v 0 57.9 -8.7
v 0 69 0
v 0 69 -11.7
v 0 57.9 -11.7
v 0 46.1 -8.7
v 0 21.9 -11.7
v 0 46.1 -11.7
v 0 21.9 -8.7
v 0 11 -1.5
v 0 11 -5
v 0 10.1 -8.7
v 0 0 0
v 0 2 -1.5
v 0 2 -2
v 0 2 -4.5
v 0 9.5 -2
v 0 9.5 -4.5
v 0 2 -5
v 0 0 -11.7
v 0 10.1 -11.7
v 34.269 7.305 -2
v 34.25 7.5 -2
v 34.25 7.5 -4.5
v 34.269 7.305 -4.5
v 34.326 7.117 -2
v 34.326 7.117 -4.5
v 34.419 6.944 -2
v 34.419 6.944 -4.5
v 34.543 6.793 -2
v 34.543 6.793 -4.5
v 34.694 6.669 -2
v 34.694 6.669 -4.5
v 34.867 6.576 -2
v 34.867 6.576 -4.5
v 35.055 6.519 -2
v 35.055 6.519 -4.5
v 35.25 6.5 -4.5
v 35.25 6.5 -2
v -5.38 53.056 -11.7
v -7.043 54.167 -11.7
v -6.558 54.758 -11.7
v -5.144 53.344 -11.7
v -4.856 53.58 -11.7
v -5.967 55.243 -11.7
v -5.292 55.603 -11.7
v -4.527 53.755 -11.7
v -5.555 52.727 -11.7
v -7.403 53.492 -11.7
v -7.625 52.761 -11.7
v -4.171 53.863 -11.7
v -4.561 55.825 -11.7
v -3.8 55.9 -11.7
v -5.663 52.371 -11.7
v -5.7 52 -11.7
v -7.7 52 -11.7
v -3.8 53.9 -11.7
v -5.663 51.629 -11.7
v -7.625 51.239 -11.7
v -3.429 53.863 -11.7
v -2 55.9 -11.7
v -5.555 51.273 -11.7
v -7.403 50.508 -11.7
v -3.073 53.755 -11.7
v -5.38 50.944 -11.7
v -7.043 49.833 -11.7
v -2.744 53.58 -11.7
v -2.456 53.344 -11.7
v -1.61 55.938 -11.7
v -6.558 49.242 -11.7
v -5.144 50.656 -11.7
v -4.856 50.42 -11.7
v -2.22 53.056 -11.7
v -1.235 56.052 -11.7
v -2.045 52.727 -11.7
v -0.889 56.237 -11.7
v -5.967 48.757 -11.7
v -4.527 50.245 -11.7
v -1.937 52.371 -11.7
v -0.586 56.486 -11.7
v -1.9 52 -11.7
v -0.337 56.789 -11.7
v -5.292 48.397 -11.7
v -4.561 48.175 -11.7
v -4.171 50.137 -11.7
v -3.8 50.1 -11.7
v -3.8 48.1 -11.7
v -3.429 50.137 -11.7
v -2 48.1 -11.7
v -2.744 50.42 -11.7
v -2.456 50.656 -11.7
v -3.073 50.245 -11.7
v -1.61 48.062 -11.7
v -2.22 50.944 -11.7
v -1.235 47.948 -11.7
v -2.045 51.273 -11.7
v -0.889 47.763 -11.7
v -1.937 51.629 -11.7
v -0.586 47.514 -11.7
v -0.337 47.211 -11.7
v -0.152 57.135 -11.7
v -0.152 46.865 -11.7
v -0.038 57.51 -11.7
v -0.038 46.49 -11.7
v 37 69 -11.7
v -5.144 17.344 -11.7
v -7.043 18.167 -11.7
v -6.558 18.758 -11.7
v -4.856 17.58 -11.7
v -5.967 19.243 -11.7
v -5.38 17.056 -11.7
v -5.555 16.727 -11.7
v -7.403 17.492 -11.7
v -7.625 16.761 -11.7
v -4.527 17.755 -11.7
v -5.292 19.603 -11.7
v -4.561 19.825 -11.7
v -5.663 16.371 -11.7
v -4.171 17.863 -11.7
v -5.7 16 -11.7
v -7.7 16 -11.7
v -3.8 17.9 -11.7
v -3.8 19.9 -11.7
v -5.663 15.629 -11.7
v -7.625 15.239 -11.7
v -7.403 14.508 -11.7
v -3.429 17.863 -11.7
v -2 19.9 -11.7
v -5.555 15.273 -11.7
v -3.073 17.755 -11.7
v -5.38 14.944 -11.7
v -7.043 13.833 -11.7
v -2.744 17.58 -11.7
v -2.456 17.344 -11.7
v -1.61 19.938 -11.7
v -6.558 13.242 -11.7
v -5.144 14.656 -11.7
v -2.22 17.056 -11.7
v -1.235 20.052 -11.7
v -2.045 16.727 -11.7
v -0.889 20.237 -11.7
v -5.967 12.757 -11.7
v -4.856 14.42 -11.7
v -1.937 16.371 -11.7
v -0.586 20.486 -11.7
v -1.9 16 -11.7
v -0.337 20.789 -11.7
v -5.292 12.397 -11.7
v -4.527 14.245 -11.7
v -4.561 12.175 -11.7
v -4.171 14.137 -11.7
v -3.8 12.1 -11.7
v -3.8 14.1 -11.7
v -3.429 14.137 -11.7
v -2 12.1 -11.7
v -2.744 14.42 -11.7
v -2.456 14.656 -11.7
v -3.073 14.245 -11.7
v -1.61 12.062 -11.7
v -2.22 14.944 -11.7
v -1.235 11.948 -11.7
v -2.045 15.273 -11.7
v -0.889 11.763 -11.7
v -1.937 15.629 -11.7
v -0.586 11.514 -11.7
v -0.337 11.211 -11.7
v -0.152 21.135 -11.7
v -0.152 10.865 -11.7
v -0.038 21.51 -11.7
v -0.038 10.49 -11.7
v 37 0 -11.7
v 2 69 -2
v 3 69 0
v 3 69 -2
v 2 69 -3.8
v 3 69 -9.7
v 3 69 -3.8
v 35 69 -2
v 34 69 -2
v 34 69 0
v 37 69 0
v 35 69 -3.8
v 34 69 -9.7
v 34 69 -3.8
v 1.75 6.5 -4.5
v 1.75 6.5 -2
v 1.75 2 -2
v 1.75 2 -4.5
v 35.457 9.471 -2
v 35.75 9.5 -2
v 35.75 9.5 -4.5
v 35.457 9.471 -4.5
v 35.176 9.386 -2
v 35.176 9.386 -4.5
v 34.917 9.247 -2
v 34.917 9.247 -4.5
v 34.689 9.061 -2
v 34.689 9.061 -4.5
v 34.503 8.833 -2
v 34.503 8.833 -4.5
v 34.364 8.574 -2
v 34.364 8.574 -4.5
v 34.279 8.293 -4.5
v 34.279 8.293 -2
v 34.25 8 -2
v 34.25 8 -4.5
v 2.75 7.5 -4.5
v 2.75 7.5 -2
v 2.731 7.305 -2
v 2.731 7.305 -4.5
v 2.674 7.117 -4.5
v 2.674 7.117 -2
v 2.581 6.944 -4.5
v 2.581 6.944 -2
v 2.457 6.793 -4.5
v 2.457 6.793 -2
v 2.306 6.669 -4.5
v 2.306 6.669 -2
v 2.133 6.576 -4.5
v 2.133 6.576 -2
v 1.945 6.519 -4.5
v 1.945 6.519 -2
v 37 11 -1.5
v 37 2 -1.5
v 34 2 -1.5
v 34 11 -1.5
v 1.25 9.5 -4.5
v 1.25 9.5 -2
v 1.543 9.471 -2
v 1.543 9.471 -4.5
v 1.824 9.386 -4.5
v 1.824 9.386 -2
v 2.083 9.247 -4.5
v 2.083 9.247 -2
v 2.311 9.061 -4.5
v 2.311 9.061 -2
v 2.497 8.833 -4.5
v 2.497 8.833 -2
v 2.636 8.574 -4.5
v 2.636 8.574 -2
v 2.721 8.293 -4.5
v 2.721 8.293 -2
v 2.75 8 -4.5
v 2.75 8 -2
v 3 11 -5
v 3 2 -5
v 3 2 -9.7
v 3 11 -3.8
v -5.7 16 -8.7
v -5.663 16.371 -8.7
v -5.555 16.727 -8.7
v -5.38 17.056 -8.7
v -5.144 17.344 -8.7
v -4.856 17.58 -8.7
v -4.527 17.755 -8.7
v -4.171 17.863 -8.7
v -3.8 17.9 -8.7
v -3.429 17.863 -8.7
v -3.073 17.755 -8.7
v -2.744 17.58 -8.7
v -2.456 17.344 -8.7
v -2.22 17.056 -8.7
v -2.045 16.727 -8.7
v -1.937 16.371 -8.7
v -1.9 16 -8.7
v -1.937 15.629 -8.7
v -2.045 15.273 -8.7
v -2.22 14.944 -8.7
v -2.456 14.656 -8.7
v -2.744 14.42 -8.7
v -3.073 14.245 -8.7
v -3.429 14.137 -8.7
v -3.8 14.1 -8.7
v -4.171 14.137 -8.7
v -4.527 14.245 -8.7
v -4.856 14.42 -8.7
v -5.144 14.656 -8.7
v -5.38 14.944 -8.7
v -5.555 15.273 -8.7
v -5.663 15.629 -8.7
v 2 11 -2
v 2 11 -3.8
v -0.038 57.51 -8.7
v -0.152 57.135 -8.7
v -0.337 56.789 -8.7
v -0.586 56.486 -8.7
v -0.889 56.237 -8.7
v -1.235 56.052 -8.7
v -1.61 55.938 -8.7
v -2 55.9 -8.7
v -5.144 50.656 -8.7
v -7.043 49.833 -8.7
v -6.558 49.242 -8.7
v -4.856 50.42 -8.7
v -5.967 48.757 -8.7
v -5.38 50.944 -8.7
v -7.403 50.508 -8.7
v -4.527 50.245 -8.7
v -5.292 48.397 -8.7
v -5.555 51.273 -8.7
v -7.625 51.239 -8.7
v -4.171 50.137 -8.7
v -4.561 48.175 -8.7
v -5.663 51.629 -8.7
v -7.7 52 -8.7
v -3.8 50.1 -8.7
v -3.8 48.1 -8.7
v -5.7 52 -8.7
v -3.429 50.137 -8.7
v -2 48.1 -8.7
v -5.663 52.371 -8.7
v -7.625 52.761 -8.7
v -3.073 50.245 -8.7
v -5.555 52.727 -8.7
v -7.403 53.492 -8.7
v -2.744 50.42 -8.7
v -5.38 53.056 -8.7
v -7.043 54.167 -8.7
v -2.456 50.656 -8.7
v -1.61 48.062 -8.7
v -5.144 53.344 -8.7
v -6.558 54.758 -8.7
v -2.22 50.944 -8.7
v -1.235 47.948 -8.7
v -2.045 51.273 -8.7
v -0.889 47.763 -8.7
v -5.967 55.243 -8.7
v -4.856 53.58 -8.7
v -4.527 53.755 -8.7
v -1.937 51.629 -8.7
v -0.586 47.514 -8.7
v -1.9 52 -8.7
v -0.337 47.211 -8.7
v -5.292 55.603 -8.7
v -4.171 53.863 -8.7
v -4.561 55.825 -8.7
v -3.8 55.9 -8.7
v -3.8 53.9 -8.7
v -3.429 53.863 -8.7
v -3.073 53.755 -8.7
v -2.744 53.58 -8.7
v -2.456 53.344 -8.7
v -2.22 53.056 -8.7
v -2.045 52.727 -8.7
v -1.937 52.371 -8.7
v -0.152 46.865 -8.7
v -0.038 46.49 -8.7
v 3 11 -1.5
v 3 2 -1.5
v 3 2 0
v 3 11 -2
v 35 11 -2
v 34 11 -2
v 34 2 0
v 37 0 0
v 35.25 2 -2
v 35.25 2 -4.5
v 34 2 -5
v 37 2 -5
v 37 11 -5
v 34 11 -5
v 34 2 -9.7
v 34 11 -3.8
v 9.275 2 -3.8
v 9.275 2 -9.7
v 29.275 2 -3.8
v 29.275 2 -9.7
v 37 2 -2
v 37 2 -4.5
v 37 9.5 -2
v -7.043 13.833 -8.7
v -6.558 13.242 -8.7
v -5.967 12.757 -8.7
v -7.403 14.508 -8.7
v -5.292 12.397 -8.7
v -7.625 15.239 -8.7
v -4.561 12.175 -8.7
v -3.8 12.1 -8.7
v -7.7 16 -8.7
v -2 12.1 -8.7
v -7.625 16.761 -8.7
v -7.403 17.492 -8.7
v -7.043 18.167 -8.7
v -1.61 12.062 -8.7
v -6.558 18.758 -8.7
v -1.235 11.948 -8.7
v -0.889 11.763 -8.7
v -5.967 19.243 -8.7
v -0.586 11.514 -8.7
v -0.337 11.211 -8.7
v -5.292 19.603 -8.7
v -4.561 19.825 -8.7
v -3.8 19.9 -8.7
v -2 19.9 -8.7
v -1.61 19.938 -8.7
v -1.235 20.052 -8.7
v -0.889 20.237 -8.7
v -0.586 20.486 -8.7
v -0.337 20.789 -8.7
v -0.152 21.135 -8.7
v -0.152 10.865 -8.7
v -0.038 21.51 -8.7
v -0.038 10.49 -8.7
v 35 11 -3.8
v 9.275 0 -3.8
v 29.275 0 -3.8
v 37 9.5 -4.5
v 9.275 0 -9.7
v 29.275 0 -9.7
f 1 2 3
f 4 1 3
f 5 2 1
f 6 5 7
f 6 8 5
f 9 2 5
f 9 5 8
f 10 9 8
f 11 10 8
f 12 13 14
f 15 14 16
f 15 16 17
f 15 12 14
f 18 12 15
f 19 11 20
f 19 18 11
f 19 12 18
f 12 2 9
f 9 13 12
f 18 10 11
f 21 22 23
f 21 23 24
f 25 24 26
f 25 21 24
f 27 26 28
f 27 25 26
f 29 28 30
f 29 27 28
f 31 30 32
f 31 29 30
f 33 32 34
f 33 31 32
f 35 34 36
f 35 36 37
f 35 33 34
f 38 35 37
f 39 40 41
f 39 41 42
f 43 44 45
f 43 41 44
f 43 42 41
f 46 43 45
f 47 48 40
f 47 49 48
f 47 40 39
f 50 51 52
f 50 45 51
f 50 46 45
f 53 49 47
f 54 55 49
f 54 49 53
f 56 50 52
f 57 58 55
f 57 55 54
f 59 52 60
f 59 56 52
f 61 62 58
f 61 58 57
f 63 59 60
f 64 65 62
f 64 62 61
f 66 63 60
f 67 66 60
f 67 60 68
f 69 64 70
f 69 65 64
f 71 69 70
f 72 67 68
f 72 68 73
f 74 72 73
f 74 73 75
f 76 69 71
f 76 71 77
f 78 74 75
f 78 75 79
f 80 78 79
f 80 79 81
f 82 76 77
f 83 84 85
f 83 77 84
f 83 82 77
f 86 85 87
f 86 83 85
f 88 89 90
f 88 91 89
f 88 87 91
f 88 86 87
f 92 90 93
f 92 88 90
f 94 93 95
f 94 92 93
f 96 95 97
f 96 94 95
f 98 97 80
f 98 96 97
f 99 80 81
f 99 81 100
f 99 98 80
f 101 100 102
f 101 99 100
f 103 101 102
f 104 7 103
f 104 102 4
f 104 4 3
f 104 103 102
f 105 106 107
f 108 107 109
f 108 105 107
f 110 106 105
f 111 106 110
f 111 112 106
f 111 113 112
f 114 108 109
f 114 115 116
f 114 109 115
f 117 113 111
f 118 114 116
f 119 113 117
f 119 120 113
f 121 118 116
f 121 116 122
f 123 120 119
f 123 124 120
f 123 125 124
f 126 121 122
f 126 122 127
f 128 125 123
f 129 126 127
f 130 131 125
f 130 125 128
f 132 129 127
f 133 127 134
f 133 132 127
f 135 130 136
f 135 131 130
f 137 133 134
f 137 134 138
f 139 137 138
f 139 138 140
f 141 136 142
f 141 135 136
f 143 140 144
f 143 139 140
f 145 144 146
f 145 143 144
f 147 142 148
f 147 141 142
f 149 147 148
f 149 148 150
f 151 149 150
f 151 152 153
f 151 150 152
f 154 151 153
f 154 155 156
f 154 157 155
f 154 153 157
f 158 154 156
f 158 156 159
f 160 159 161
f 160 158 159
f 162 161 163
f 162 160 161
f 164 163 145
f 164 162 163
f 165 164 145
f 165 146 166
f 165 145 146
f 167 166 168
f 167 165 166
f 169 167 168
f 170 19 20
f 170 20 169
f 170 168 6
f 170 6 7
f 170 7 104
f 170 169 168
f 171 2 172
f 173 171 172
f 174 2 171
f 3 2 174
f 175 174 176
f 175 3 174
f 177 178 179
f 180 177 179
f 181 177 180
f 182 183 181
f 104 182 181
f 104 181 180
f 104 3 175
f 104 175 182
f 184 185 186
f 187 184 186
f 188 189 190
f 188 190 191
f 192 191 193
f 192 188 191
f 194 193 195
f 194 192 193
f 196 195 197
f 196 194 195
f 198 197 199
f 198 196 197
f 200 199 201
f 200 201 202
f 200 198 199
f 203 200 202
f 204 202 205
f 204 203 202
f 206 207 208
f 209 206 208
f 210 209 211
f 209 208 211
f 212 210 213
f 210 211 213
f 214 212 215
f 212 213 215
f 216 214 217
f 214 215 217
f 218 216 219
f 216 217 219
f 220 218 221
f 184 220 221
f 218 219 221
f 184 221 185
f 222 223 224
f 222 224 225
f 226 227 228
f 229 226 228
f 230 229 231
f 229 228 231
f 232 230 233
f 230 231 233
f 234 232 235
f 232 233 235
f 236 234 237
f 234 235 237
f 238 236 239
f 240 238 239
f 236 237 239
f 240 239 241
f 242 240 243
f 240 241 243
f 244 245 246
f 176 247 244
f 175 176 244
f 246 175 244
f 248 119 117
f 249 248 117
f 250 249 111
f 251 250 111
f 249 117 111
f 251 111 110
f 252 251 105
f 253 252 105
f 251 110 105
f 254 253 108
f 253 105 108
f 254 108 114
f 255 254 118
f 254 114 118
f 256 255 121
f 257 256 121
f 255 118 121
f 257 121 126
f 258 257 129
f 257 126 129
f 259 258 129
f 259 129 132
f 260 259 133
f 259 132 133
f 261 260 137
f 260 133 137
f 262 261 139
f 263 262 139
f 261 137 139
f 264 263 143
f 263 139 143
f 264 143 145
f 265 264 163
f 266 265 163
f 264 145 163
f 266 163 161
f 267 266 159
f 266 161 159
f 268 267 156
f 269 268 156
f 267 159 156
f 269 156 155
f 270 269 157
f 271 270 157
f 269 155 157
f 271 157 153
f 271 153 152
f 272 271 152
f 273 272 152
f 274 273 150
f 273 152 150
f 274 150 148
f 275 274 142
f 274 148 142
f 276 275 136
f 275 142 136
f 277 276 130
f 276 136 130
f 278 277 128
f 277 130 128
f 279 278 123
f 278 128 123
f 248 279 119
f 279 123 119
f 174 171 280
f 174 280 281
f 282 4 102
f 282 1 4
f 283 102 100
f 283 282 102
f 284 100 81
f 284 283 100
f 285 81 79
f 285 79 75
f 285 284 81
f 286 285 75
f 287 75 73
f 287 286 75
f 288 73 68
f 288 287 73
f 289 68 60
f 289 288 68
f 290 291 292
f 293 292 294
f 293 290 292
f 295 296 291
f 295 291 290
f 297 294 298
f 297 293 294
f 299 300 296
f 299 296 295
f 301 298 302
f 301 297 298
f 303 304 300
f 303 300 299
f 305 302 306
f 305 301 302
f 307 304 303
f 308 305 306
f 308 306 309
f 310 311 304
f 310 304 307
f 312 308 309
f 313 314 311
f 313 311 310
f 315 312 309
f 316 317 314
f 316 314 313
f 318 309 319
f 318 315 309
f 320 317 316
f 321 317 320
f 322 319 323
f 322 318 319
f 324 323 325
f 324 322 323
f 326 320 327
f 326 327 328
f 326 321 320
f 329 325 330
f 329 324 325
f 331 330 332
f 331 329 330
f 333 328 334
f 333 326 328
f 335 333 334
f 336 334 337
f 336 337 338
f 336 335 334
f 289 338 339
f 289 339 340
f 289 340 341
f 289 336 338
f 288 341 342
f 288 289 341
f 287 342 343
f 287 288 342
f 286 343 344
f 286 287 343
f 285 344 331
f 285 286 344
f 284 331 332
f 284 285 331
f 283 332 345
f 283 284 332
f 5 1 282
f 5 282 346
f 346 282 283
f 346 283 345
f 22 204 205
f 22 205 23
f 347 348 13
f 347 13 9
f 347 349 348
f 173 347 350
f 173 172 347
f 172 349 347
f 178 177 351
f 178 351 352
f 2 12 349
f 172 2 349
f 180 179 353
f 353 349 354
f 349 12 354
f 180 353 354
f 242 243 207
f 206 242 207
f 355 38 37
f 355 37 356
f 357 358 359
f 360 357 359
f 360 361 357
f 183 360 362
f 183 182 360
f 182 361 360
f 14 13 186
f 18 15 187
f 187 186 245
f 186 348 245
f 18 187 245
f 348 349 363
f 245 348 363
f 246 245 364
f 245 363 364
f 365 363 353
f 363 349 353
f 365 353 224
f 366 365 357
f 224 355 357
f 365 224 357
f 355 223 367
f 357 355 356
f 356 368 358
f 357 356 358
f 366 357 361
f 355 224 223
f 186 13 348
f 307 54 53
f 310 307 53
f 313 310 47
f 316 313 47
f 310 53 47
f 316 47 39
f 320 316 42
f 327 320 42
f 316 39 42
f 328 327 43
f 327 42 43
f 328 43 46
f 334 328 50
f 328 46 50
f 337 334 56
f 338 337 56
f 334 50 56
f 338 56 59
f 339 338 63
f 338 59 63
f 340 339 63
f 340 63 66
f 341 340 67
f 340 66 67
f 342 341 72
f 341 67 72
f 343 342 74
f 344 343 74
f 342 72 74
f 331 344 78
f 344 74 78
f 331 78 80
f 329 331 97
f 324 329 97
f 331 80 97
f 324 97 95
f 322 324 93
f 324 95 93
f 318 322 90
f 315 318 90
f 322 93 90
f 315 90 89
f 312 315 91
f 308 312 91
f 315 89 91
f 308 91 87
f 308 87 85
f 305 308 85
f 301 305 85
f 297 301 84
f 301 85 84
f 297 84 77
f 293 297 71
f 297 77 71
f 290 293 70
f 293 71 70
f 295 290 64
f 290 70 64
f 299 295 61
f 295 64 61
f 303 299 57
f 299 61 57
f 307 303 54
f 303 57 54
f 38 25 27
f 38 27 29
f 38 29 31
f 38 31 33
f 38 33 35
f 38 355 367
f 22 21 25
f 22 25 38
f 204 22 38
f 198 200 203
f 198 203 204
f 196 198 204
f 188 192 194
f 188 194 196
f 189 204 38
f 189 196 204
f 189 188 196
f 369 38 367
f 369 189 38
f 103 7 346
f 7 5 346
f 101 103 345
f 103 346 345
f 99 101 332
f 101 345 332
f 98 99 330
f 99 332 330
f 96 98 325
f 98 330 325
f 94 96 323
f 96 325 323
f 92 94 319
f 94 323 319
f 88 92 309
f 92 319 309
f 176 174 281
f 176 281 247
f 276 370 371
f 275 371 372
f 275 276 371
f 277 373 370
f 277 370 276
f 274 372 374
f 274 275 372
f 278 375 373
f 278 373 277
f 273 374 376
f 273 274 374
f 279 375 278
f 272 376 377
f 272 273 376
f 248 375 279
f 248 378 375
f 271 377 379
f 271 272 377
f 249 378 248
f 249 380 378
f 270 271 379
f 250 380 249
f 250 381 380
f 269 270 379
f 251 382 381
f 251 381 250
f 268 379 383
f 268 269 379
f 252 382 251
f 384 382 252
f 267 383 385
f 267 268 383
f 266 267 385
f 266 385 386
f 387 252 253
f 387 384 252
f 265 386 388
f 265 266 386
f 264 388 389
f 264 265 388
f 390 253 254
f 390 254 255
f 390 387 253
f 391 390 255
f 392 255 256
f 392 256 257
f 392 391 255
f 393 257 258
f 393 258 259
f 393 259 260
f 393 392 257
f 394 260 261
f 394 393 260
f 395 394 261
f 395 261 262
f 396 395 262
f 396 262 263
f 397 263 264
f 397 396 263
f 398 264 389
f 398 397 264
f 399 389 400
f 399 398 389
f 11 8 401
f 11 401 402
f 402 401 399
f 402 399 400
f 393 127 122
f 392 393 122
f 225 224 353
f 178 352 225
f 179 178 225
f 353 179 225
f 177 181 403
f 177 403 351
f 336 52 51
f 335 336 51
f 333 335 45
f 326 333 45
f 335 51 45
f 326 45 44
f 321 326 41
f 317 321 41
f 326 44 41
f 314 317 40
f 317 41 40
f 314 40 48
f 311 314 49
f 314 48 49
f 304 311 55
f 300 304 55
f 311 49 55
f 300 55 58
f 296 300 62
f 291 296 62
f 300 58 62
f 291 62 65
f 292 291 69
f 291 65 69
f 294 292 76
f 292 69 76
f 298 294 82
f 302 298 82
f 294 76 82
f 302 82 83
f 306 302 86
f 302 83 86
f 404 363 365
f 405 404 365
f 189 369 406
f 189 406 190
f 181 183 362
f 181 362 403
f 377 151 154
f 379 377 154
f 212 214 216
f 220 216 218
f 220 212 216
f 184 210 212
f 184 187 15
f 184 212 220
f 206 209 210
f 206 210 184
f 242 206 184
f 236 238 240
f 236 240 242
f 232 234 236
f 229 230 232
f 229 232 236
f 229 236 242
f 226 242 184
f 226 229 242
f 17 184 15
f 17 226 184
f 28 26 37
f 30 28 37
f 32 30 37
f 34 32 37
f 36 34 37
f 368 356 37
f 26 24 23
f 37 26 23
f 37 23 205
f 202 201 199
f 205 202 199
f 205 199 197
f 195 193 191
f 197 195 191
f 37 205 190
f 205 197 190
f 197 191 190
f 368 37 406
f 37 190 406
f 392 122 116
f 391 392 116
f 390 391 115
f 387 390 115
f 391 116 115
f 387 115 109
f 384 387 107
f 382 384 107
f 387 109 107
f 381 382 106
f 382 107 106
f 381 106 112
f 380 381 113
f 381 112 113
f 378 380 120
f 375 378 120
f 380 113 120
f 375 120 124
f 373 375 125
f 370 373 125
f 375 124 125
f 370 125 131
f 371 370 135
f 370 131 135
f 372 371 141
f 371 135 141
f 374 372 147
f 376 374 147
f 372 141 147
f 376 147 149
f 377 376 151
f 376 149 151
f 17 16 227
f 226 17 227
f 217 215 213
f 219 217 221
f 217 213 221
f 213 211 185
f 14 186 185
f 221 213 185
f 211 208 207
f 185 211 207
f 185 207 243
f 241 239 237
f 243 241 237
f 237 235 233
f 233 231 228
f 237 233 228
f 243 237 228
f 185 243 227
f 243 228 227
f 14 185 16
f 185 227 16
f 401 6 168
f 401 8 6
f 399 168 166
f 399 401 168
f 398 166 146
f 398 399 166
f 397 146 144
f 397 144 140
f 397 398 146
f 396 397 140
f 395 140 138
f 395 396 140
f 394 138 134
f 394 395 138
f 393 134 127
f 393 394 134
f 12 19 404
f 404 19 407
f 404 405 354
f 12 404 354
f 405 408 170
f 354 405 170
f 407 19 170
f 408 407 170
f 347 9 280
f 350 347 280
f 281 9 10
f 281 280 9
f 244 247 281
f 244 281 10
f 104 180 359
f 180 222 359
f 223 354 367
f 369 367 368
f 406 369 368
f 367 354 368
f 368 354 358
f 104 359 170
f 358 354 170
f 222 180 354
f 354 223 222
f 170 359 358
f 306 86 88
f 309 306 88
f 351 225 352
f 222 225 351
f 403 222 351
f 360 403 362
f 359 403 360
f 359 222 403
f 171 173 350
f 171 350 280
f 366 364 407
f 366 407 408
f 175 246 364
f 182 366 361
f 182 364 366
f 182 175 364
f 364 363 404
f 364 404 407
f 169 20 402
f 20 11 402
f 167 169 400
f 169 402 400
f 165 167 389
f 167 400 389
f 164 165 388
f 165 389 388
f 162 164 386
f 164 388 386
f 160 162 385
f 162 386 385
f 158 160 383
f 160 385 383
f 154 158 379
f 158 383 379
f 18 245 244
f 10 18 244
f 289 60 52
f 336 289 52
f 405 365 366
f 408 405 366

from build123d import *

# Parameters (mm, degrees)
SKETCH1_W           = 37
SKETCH1_H           = 11.7
BOSS_EXTRUDE1_DEPTH = 69
CUT_EXTRUDE1_DEPTH  = 67
SKETCH3_W           = 20
SKETCH3_H           = 5.9
CUT_EXTRUDE2_DEPTH  = 67
SKETCH4_R           = 1.9
BOSS_EXTRUDE2_DEPTH = 3
FILLET1_R           = 2
SKETCH5_W           = 3.5
SKETCH5_H           = 9
CUT_EXTRUDE3_DEPTH  = 40
BOSS_EXTRUDE3_START = 0.5
BOSS_EXTRUDE3_DEPTH = 2.5


with BuildPart() as part:
    # Sketch1 → Boss-Extrude1 (new body)
    with BuildSketch(Plane(origin=(0, 0, 0), x_dir=(1, 0, 0), z_dir=(0, 1, 0))):
        with Locations((18.5, 5.85)):
            Rectangle(SKETCH1_W, SKETCH1_H)
    extrude(amount=BOSS_EXTRUDE1_DEPTH)

    # Sketch2 → Cut-Extrude1 (cut)
    with BuildSketch(Plane(origin=(0, 69, 0), x_dir=(1, 0, 0), z_dir=(0, 1, 0))):
        Polygon((3, 0), (3, 2), (2, 2), (2, 3.8), (3, 3.8), (3, 9.7), (34, 9.7), (34, 3.8), (35, 3.8), (35, 2), (34, 2), (34, 0), align=None)
    extrude(amount=-CUT_EXTRUDE1_DEPTH, mode=Mode.SUBTRACT)

    # Sketch3 → Cut-Extrude2 (cut)
    with BuildSketch(Plane(origin=(0, 2, 0), x_dir=(1, 0, 0), z_dir=(0, 1, 0))):
        with Locations((19.275, 6.75)):
            Rectangle(SKETCH3_W, SKETCH3_H)
    extrude(amount=-CUT_EXTRUDE2_DEPTH, mode=Mode.SUBTRACT)

    # Sketch4 → Boss-Extrude2 (add)
    # profile 1 of 2: a face of its own
    with BuildSketch(Plane(origin=(48.7, 0, -11.7), x_dir=(-1, 0, 0), z_dir=(0, 0, -1))):
        with BuildLine():
            Line((48.7, 55.9), (52.5, 55.9))
            ThreePointArc((52.5, 55.9), (56.4, 52), (52.5, 48.1))
            Line((52.5, 48.1), (48.7, 48.1))
            Line((48.7, 48.1), (48.7, 55.9))
        make_face()
        with Locations((52.5, 52)):
            Circle(SKETCH4_R, mode=Mode.SUBTRACT)
    # profile 2 of 2: a face of its own
    with BuildSketch(Plane(origin=(48.7, 0, -11.7), x_dir=(-1, 0, 0), z_dir=(0, 0, -1))):
        with BuildLine():
            Line((48.7, 19.9), (52.5, 19.9))
            ThreePointArc((52.5, 19.9), (56.4, 16), (52.5, 12.1))
            Line((52.5, 12.1), (48.7, 12.1))
            Line((48.7, 12.1), (48.7, 19.9))
        make_face()
        with Locations((52.5, 16)):
            Circle(SKETCH4_R, mode=Mode.SUBTRACT)
    extrude(amount=-BOSS_EXTRUDE2_DEPTH)

    # Fillet1
    fillet1_edges = [part.edges().sort_by_distance(p)[0] for p in [
        (0, 48.1, -10.2),
        (0, 55.9, -10.2),
        (0, 12.1, -10.2),
        (0, 19.9, -10.2),
    ]]
    fillet(fillet1_edges, radius=FILLET1_R)

    # Sketch5 → Cut-Extrude3 (cut)
    with BuildSketch(Plane(origin=(37, 0, 0), x_dir=(0, 0, -1), z_dir=(1, 0, 0))):
        with Locations((3.25, 6.5)):
            Rectangle(SKETCH5_W, SKETCH5_H)
    extrude(amount=-CUT_EXTRUDE3_DEPTH, mode=Mode.SUBTRACT)

    # Sketch6 → Boss-Extrude3 (add)
    with BuildSketch(Plane(origin=(0, 0, -1.5), x_dir=(-1, 0, 0), z_dir=(0, 0, -1)).offset(BOSS_EXTRUDE3_START)):
        with BuildLine():
            Line((0, 2), (0, 9.5))
            Line((0, 9.5), (-1.25, 9.5))
            ThreePointArc((-1.25, 9.5), (-2.310660172, 9.060660172), (-2.75, 8))
            Line((-2.75, 8), (-2.75, 7.5))
            ThreePointArc((-2.75, 7.5), (-2.457106781, 6.792893219), (-1.75, 6.5))
            Line((-1.75, 6.5), (-1.75, 2))
            Line((-1.75, 2), (0, 2))
        make_face()
    boss_extrude3 = extrude(amount=BOSS_EXTRUDE3_DEPTH)

    # Mirror1: Boss-Extrude3 across plane
    add(boss_extrude3.mirror(Plane.ZY.offset(-18.5)))


solid = part.part
